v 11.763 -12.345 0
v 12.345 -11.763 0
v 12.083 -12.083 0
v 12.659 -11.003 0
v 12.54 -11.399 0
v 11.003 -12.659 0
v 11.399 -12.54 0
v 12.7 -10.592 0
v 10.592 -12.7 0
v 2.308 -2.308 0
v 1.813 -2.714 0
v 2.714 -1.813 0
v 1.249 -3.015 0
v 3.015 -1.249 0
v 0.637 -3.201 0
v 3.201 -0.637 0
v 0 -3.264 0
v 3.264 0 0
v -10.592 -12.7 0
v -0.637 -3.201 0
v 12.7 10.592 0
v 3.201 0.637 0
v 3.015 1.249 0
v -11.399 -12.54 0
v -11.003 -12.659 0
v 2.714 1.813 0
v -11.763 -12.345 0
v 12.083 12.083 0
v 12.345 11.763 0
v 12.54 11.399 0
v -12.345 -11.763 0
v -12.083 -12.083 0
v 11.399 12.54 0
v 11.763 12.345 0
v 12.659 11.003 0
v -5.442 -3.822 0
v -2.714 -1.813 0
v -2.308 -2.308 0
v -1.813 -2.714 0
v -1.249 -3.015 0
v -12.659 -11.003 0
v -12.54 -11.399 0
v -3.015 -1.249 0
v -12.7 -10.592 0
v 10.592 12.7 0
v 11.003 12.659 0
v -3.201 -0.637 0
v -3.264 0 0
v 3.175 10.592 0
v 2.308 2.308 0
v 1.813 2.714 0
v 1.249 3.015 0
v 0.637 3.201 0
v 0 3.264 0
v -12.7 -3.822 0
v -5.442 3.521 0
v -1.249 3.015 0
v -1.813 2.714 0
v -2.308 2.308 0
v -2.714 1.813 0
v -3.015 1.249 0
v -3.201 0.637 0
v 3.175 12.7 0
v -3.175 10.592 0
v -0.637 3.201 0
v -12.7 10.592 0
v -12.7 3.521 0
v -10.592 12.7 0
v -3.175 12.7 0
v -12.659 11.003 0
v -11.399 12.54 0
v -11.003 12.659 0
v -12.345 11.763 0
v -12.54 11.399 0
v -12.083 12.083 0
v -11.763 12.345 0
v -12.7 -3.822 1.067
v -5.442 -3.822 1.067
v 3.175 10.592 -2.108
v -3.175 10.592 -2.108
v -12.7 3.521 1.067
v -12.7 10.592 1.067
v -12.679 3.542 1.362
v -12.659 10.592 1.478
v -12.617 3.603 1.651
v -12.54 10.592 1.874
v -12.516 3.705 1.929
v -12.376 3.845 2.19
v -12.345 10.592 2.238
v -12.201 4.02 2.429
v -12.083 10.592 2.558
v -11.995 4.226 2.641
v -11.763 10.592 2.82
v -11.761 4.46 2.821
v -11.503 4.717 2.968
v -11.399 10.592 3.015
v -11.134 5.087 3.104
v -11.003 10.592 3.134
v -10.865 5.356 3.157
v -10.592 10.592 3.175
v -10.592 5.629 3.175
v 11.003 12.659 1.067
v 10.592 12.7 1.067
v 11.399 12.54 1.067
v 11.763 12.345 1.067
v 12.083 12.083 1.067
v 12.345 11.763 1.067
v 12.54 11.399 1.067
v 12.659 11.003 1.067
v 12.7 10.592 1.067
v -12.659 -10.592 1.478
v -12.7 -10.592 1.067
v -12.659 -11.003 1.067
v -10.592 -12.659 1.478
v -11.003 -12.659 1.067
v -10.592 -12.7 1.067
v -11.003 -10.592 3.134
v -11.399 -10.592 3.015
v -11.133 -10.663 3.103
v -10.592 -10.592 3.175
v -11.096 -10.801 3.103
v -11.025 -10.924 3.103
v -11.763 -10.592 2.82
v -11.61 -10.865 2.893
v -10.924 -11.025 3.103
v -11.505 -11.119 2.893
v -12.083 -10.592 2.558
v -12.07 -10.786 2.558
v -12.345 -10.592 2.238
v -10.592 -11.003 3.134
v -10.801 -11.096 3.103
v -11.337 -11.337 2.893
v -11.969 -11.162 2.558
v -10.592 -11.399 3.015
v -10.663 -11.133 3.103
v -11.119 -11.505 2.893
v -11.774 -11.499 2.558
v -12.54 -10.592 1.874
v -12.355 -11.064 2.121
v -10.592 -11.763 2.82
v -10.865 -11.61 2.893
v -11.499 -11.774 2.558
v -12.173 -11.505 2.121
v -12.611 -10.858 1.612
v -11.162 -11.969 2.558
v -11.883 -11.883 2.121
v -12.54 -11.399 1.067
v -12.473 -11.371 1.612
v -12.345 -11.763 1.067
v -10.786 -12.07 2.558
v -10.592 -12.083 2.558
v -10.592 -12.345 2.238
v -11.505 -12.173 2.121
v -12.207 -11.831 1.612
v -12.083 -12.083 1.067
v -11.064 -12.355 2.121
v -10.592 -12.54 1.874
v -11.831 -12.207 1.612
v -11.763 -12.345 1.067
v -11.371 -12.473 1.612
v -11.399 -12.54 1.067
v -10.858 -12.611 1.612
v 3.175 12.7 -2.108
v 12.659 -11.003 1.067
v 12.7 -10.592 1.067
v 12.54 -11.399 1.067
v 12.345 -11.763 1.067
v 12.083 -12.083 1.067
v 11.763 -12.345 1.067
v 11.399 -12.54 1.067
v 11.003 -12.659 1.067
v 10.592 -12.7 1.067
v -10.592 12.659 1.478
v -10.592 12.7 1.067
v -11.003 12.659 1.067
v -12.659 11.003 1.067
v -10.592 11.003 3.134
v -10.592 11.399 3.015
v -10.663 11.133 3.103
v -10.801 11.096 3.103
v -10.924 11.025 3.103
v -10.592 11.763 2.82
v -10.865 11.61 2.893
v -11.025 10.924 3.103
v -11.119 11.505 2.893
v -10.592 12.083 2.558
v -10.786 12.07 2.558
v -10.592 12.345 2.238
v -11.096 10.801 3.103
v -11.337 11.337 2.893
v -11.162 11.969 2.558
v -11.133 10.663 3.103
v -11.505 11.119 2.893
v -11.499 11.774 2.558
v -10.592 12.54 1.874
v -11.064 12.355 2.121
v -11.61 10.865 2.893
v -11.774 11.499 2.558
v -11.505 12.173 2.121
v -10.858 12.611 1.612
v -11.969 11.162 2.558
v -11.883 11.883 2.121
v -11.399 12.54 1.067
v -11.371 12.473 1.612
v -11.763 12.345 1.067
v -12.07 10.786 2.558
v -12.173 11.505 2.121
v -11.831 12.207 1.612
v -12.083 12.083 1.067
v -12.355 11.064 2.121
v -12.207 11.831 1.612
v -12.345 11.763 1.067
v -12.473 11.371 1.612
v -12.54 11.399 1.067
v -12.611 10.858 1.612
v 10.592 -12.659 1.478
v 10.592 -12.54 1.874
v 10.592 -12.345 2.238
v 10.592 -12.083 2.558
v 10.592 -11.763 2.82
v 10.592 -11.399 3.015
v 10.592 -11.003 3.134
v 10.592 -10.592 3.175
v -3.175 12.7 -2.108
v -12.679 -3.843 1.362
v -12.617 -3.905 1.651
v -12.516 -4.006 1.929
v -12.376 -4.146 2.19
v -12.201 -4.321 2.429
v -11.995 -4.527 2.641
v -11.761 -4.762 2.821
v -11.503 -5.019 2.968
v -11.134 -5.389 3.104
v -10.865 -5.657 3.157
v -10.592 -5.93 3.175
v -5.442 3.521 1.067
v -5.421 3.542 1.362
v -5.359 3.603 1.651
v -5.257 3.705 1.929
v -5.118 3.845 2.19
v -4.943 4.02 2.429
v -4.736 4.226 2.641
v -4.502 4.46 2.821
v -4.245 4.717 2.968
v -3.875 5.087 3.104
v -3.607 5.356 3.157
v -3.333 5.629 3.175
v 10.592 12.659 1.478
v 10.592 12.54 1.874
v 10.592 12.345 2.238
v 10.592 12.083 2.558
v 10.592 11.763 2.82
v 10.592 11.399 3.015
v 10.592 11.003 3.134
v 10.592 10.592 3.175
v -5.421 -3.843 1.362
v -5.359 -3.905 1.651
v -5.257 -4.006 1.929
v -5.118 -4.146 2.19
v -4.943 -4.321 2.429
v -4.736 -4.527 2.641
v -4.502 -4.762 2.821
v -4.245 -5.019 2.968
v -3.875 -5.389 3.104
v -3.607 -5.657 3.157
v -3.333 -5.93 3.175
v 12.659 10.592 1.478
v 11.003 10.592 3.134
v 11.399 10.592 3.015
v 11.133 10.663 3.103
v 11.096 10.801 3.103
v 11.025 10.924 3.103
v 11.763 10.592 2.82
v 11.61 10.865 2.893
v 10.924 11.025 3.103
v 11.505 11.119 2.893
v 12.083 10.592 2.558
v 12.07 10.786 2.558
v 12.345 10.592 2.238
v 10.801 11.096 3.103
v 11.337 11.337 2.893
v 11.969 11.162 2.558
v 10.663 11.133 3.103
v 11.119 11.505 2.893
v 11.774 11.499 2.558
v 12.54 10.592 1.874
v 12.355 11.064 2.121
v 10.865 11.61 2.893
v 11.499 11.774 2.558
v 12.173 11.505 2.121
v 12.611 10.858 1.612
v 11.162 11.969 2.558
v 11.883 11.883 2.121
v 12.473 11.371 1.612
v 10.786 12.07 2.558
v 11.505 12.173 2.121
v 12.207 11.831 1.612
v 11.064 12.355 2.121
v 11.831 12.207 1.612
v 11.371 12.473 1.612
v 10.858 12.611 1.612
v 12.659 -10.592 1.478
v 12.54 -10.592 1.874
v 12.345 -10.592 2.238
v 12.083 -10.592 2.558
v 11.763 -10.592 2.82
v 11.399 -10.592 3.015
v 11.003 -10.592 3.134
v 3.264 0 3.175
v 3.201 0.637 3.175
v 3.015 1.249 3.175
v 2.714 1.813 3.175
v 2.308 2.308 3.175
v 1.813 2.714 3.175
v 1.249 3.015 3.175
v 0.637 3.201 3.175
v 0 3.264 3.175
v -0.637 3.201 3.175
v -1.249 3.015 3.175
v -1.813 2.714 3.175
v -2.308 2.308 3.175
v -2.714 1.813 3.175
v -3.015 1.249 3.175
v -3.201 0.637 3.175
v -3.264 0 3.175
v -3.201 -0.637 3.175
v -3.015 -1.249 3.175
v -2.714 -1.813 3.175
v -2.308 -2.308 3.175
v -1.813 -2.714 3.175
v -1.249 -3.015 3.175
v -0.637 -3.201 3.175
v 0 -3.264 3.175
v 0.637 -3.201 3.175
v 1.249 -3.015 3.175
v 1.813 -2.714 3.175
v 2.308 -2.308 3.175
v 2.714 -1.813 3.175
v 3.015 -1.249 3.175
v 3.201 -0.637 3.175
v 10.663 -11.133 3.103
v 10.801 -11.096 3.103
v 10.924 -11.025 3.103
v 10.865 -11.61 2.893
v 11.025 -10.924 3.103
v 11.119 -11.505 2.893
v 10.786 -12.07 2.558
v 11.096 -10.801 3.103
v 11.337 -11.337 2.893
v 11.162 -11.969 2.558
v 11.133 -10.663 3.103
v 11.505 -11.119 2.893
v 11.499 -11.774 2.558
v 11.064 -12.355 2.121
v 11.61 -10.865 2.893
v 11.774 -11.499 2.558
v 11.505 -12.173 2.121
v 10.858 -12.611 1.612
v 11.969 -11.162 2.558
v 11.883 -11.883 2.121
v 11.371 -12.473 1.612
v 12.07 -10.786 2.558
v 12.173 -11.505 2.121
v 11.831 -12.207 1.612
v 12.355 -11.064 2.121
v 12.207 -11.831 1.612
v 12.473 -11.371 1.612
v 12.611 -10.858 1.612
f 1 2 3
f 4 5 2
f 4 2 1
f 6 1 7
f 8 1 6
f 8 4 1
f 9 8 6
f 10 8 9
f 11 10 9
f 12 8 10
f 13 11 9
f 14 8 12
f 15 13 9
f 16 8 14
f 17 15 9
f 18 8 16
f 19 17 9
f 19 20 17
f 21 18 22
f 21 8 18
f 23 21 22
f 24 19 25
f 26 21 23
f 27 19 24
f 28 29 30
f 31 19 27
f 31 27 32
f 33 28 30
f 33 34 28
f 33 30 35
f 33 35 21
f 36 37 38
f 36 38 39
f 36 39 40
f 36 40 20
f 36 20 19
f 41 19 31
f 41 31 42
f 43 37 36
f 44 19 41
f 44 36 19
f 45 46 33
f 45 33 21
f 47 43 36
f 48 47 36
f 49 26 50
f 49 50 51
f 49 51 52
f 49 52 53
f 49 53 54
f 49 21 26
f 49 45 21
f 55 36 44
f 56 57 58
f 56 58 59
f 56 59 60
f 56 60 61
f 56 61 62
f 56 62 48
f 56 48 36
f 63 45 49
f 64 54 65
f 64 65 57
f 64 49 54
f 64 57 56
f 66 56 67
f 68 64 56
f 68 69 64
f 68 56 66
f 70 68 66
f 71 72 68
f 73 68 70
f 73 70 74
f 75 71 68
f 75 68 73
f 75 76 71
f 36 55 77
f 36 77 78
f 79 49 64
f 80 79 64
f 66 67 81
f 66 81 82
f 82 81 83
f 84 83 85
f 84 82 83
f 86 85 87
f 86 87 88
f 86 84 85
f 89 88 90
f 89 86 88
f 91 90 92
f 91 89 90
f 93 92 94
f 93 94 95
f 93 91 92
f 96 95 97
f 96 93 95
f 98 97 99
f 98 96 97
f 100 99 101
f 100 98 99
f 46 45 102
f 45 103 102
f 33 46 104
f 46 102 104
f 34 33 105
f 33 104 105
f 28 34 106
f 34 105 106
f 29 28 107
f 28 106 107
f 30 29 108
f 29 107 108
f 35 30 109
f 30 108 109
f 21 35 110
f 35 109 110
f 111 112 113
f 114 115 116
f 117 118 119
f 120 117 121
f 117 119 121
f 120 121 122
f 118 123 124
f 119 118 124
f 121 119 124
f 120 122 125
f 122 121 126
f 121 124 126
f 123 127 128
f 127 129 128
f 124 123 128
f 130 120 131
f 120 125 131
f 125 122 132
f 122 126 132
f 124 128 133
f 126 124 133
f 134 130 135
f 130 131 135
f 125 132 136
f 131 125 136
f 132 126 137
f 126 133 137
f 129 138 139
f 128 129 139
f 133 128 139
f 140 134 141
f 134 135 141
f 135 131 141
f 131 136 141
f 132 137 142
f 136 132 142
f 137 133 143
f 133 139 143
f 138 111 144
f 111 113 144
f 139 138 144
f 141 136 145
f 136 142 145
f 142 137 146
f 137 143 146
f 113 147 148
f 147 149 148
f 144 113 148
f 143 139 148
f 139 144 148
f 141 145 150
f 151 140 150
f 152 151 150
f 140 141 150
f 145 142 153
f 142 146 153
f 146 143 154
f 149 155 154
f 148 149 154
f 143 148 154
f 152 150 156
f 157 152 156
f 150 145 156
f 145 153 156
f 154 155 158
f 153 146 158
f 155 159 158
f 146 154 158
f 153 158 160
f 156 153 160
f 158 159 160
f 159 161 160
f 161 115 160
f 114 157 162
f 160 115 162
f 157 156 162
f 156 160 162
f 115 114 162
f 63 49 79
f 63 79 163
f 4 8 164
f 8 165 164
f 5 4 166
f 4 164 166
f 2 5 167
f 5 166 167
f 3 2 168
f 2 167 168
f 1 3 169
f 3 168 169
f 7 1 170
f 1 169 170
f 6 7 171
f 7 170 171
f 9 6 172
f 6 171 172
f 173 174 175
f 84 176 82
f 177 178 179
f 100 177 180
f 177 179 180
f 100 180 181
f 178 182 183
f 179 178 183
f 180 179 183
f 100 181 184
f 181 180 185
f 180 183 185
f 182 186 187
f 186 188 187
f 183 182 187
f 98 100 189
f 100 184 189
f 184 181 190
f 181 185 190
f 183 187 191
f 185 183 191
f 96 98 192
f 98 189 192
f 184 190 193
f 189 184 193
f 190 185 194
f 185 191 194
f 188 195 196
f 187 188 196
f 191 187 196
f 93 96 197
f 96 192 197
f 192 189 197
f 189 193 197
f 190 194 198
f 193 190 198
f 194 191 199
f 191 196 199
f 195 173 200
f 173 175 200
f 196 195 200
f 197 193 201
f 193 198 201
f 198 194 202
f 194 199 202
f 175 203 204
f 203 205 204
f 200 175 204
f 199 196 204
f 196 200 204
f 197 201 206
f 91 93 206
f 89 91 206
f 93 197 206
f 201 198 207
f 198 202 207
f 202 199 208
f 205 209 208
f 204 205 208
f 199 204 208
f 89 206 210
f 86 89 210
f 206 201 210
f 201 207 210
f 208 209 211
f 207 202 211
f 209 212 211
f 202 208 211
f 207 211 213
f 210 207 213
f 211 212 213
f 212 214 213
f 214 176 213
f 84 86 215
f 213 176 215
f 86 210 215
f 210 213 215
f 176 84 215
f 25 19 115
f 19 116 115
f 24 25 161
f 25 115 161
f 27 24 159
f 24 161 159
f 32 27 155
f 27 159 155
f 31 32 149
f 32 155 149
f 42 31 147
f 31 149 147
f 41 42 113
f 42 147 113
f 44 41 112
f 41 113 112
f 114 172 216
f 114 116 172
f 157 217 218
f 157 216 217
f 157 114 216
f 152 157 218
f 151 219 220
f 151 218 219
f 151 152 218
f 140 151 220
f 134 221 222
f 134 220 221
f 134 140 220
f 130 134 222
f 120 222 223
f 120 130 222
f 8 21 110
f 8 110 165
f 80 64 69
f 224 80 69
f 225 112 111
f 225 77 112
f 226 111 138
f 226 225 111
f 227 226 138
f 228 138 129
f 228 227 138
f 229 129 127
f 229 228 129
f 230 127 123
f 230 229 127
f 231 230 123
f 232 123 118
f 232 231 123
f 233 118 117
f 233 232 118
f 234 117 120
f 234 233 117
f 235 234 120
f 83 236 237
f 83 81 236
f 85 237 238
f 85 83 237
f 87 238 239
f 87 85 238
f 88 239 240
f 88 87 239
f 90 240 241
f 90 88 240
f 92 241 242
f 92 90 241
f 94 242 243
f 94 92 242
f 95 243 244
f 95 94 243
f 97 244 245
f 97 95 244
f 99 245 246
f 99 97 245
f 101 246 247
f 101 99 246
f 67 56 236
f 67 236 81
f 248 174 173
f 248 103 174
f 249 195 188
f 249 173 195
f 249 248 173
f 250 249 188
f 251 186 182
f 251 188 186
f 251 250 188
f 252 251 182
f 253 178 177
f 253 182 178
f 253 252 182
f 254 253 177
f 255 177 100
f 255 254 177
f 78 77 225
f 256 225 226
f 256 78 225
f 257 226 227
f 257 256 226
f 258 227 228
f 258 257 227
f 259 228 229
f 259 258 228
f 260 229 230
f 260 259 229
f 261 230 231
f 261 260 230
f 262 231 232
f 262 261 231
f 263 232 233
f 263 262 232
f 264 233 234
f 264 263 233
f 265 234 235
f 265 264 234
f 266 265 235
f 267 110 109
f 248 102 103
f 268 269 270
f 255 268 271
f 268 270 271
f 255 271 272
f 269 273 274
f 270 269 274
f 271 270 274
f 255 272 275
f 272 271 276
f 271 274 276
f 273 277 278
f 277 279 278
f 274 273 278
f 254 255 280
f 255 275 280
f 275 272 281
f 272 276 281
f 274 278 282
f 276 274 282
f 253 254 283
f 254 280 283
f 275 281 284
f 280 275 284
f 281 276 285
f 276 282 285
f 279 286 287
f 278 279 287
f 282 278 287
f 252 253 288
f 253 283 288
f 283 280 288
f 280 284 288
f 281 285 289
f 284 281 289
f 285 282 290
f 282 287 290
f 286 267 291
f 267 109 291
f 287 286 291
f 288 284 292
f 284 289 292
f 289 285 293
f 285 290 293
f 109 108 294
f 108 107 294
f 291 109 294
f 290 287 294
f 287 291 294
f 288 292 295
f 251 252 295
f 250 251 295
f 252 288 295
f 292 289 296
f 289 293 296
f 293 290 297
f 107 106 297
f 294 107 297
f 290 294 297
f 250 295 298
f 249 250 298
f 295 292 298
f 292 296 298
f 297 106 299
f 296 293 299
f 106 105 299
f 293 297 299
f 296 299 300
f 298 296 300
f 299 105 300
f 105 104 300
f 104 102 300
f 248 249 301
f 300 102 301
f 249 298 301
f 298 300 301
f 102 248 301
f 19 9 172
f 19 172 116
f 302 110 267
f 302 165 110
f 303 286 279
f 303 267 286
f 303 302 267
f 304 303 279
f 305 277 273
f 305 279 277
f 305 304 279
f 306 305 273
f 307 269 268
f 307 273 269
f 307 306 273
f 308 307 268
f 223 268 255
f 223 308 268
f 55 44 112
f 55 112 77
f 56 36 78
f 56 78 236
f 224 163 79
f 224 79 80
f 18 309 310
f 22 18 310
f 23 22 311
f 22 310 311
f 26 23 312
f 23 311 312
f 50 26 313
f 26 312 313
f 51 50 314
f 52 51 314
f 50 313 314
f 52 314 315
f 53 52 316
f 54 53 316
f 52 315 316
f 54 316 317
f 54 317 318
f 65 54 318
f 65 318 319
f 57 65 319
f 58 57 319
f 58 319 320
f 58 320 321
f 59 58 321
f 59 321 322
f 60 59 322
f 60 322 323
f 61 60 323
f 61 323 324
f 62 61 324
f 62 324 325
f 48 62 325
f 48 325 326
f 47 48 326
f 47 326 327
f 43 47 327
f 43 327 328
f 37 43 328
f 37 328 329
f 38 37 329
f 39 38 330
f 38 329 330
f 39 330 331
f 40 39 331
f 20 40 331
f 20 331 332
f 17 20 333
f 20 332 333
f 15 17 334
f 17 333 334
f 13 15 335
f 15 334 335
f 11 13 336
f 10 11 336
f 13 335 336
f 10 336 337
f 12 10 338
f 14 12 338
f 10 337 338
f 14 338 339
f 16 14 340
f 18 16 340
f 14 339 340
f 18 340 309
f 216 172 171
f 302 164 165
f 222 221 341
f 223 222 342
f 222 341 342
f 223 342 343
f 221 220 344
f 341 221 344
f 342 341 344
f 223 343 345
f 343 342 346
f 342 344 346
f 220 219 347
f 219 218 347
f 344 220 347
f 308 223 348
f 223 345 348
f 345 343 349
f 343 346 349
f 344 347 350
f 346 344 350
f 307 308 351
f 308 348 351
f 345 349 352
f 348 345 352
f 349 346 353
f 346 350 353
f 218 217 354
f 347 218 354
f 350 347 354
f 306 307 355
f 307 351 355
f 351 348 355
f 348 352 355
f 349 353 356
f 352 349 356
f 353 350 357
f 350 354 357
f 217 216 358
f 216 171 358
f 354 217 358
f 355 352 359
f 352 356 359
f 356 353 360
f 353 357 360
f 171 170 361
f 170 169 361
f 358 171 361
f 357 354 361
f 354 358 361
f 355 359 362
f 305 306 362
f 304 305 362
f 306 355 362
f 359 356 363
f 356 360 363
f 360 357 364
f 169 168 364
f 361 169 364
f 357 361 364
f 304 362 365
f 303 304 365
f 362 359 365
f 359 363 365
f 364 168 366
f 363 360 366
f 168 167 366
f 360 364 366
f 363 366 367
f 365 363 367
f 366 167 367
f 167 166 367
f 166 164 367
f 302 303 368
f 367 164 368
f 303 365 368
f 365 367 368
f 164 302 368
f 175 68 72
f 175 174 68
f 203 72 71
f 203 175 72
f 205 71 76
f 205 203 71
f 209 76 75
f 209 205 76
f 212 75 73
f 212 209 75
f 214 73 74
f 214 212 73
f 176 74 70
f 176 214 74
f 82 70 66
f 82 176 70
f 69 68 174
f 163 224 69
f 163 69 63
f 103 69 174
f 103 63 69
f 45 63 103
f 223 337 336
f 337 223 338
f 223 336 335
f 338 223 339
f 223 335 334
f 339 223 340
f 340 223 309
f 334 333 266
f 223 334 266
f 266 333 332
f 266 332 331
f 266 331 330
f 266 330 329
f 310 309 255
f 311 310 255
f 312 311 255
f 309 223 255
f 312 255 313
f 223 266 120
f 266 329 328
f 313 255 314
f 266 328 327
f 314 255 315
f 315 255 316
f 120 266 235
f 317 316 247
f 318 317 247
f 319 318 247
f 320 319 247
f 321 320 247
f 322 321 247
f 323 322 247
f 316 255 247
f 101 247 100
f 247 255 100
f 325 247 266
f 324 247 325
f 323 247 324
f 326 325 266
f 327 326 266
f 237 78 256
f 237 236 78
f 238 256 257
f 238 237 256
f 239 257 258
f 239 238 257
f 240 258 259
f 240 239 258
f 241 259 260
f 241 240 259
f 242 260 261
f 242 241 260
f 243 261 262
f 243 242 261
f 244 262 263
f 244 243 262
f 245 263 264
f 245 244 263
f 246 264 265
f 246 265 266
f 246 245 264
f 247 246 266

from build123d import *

# Parameters (mm, degrees)
BOSS_EXTRUDE1_DEPTH = 3.175
FILLET1_R           = 2.1082
CUT_EXTRUDE1_REACH  = 5.175
SKETCH2_R           = 3.2639
SKETCH3_W           = 6.35
SKETCH3_H           = 2.1082
BOSS_EXTRUDE2_DEPTH = 2.1082


with BuildPart() as part:
    # Sketch1 → Boss-Extrude1 (new body)
    with BuildSketch(Plane.XY):
        Polygon((-12.7, 12.7), (12.7, 12.7), (12.7, -12.7), (-12.7, -12.7), (-12.7, -3.822069256), (-5.441576375, -3.822069256), (-5.441576375, 3.520801512), (-12.7, 3.520801512), align=None)
    extrude(amount=BOSS_EXTRUDE1_DEPTH)

    # Fillet1
    fillet1_edges = [part.edges().sort_by_distance(p)[0] for p in [
        (-5.441576375, -0.150633872, 3.175),
        (-9.070788187, -3.822069256, 3.175),
        (-12.7, 12.7, 1.5875),
        (12.7, 12.7, 1.5875),
        (12.7, -12.7, 1.5875),
        (-12.7, -12.7, 1.5875),
        (-12.7, -8.261034628, 3.175),
        (0, -12.7, 3.175),
        (12.7, 0, 3.175),
        (0, 12.7, 3.175),
        (-12.7, 8.110400756, 3.175),
        (-9.070788187, 3.520801512, 3.175),
    ]]
    fillet(fillet1_edges, radius=FILLET1_R)

    # Sketch2 → Cut-Extrude1 (cut, up to next)
    with BuildSketch(Plane.XY.offset(3.175), mode=Mode.PRIVATE) as cut_extrude1_sk1:
        Circle(SKETCH2_R)
    cut_extrude1_tool1 = extrude(cut_extrude1_sk1.sketch, amount=-CUT_EXTRUDE1_REACH, mode=Mode.PRIVATE) & part.part
    add(cut_extrude1_tool1.solids().sort_by_distance((0, 0, 3.175))[0], mode=Mode.SUBTRACT)

    # Sketch3 → Boss-Extrude2 (add)
    with BuildSketch(Plane(origin=(0, 0, 0), x_dir=(-1, 0, 0), z_dir=(0, 0, -1))):
        with Locations((0, 11.6459)):
            Rectangle(SKETCH3_W, SKETCH3_H)
    extrude(amount=BOSS_EXTRUDE2_DEPTH)


solid = part.part
